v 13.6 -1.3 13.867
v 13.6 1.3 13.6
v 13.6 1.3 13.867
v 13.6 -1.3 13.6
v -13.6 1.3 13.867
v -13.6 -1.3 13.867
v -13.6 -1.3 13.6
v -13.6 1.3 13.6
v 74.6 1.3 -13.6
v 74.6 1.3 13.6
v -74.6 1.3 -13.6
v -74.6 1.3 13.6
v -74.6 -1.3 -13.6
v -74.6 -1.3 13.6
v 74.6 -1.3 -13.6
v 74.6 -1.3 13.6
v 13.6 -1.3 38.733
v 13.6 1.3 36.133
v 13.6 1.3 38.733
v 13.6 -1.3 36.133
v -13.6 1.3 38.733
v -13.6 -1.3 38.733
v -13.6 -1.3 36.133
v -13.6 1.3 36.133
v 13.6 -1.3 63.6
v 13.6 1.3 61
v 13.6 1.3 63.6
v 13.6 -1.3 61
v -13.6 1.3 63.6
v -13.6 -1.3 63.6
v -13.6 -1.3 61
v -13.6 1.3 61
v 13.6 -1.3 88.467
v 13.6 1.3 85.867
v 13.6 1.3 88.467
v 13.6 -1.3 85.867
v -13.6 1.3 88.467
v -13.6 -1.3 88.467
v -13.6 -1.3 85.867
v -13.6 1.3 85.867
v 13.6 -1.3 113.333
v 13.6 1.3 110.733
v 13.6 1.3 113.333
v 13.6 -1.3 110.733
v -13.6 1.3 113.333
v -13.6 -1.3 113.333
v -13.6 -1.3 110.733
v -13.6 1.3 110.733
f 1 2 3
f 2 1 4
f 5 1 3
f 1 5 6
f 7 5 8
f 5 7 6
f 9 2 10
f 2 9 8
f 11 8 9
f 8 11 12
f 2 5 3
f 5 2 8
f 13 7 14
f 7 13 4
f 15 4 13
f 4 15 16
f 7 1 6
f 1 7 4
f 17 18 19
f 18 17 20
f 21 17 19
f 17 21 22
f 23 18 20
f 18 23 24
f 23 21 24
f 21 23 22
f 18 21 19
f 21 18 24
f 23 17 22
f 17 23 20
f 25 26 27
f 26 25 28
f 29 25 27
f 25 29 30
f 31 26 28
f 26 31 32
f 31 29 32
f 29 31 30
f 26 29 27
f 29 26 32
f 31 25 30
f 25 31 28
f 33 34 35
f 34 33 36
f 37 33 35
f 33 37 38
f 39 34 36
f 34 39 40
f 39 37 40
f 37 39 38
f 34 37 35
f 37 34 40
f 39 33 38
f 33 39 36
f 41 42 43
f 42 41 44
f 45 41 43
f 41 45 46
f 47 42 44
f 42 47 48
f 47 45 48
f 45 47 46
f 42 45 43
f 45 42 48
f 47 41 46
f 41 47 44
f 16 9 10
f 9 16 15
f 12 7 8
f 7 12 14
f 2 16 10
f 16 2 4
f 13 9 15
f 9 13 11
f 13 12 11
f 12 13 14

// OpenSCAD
module crossbar_rod() {
    rod_length = 149.2;
    rod_width = 2.6;
    rod_height = 27.2;
    tab_width = 27.2;
    tab_height = 2.6;
    tab_thickness = 2.6;
    num_tabs = 5;
    tab_spacing = rod_length / (num_tabs + 1);

    // Main rod
    translate([-rod_length / 2, -rod_width / 2, -rod_height / 2])
        cube([rod_length, rod_width, rod_height]);

    // Tabs
    for (i = [1:num_tabs]) {
        translate([-tab_width / 2, -tab_thickness / 2, -rod_height / 2 + i * tab_spacing])
            cube([tab_width, tab_thickness, tab_height]);
    }
}

crossbar_rod();
